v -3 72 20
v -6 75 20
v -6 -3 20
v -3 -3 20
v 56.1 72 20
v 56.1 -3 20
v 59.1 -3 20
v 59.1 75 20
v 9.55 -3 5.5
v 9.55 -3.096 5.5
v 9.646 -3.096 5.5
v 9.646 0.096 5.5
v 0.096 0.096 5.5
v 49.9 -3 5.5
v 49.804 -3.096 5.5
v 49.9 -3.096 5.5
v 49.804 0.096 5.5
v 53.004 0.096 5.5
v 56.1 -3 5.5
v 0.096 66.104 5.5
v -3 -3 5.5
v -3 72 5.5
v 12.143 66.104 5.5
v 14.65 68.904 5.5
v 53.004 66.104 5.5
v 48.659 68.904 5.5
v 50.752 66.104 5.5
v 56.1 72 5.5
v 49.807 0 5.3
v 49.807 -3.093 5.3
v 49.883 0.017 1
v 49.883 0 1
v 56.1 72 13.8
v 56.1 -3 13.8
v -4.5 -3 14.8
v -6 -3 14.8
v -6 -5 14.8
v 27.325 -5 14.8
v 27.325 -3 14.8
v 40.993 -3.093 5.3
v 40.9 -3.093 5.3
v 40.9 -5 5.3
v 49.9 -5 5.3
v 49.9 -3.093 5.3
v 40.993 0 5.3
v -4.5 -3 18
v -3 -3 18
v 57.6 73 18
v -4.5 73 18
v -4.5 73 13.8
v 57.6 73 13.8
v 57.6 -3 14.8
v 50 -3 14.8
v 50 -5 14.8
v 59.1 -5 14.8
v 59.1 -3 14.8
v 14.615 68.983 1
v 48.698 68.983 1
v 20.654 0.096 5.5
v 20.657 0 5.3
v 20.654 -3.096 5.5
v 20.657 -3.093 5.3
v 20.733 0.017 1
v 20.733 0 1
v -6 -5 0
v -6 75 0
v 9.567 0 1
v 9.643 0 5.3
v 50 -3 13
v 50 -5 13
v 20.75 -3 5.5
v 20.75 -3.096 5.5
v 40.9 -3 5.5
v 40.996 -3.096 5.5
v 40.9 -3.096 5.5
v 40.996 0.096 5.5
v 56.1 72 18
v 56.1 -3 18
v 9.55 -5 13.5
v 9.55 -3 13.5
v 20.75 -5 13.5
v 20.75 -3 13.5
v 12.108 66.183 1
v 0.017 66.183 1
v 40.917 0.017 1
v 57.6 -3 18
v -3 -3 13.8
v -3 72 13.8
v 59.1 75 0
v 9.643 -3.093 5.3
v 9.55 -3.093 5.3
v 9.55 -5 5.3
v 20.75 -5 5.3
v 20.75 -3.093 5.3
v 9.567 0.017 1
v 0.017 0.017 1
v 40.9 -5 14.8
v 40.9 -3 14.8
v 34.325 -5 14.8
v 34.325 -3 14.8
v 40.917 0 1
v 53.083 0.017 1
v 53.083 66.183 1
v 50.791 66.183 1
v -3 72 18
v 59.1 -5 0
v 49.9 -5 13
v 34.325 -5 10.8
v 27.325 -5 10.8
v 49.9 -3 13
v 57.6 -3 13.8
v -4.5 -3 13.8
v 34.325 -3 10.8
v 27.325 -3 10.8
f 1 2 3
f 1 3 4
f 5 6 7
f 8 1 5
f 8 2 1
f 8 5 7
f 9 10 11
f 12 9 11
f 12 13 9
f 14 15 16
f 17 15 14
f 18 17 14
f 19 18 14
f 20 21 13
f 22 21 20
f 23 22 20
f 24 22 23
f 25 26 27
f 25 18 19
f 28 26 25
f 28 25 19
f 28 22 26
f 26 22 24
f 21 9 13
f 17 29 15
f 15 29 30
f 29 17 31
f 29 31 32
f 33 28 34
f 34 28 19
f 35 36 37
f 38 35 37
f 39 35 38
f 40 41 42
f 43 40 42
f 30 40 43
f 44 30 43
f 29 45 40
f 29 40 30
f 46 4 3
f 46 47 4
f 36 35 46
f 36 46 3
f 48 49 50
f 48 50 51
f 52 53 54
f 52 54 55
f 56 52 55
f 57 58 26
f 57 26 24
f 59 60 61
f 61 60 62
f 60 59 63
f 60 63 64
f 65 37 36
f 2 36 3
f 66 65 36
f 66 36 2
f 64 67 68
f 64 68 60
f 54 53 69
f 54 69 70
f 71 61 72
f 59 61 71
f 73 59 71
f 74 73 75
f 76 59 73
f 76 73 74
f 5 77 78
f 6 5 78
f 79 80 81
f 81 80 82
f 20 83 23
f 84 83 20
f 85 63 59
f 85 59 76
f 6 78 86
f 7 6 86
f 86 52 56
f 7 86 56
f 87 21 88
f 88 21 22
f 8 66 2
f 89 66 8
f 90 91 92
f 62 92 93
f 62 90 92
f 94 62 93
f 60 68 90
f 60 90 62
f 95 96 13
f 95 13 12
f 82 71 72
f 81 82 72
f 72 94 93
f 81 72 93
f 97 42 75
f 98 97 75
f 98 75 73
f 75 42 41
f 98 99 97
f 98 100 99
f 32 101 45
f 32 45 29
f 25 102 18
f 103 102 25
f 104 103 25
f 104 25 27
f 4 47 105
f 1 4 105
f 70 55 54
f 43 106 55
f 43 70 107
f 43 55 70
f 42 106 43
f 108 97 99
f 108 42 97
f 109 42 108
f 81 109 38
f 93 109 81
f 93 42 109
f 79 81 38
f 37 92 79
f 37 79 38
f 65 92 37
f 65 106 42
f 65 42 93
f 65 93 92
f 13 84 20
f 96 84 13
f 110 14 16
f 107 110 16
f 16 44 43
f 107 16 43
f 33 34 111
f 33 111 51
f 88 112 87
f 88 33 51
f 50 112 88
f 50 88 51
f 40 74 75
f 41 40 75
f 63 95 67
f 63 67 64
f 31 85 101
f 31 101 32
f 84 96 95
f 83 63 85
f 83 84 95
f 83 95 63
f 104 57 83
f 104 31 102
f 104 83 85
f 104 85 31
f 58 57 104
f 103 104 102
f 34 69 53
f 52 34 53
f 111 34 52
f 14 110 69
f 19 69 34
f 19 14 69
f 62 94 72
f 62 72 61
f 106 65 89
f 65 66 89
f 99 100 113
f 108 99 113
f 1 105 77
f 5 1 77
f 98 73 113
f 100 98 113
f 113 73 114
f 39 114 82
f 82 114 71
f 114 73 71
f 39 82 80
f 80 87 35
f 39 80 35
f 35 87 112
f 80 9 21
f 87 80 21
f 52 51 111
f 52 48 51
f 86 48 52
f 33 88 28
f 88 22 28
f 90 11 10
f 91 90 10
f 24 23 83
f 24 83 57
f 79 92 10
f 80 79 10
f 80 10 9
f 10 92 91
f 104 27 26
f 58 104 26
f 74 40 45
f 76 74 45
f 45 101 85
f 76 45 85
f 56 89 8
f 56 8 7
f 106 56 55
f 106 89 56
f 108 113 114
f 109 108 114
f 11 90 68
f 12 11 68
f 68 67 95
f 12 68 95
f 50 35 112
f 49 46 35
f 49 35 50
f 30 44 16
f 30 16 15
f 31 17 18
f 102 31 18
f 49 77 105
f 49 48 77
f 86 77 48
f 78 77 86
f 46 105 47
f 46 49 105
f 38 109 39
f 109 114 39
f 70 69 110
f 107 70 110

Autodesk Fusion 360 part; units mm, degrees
sketch "Esquisse1" plane through (0, 0, 0) normal (0, 0, 1) x (1, 0, 0)
  line L0 (0, 0) -> (53.1, 0)
  line L1 (53.1, 0) -> (53.1, 66.2)
  line L2 (0, 66.2) -> (0, 0)
  line L3 (40.9, 0) -> (49.9, 0)
  line L4 (49.9, 0) -> (49.9, -5.2)
  line L5 (49.9, -5.2) -> (40.9, -5.2)
  line L6 (40.9, -5.2) -> (40.9, 0)
  line L7 (11.5, 0) -> (18.8, 0)
  line L8 (18.8, 0) -> (18.8, -1.2)
  line L9 (18.8, -1.2) -> (11.5, -1.2)
  line L10 (11.5, -1.2) -> (11.5, 0)
  line L11 (53.1, 66.2) -> (50.8, 66.2) construction
  line L12 (50.8, 66.2) -> (48.7068, 69)
  line L13 (48.7068, 69) -> (14.6068, 69)
  line L14 (12.1, 66.2) -> (14.6068, 69)
  line L15 (53.1, 66.2) -> (50.8, 66.2)
  line L16 (12.1, 66.2) -> (0, 66.2)
  line L17 (40.9, 0) -> (49.9, 0)
  line L18 (11.5, 0) -> (18.8, 0)
  line L19 (0, 33.1) -> (53.1, 33.1) construction
  line L20 (26.55, 0) -> (26.55, 33.1) construction
  line L21 (0, 66.2) -> (0, 68.7) construction
  line L22 (0, 68.7) -> (53.1, 68.7) construction
  line L23 (53.1, 68.7) -> (53.1, 66.2) construction
  line L24 (-3, 72) -> (56.1, 72)
  line L25 (56.1, 72) -> (56.1, -3)
  line L26 (56.1, -3) -> (-3, -3)
  line L27 (-3, -3) -> (-3, 72)
  line L28 (-6, 75) -> (59.1, 75)
  line L29 (59.1, 75) -> (59.1, -5)
  line L30 (59.1, -5) -> (-6, -5)
  line L31 (-6, -5) -> (-6, 75)
  line L32 (26.55, 75) -> (26.55, -5) construction
  line L33 (11.5, -1.2) -> (11.5, -5)
  line L34 (18.8, -1.2) -> (18.8, -5)
  line L35 (15.15, 0) -> (15.15, -5) construction
  line L36 (9.55, 0) -> (20.75, 0)
  line L37 (20.75, 0) -> (20.75, -5)
  line L38 (20.75, -5) -> (9.55, -5)
  line L39 (9.55, -5) -> (9.55, 0)
  line L40 (15.15, 0) -> (15.15, -5) construction
  line L41 (-3, -3) -> (-6, -3)
  line L42 (56.1, -3) -> (59.1, -3)
  dimension "d1" = 66.2
  dimension "d13" = 53.1
  dimension "d14" = 3.2
  dimension "d15" = 9
  dimension "d16" = 5.2
  dimension "d17" = 11.5
  dimension "d18" = 7.3
  dimension "d19" = 1.2
  dimension "d21" = 2.3
  dimension "d22" = 38.7
  dimension "d25" = 34.1
  dimension "d43" = 3
  dimension "d44" = 3
  dimension "d45" = 3
  dimension "d46" = 3
  dimension "d47" = 3
  dimension "d48" = 3
  dimension "d52" = 11.2
extrude "Extrusion6" add sketch "Esquisse1" along normal blind 1 contours L0 L1 L2 L3 L7 L12 L13 L14 L15 L16 L17 L18 L36
extrude "Extrusion7" add sketch "Esquisse1" along normal blind 5.5 draft 1 contours L0 L1 L2 L4 L12 L13 L14 L15 L16 L24 L25 L26 L27 L39 | L0 L6 L26 L37
extrude "Extrusion8" add sketch "Esquisse1" along normal blind 20 contours L24 L25 L27 L28 L29 L31 L41 L42
extrude "Extrusion9" add sketch "Esquisse1" along normal blind 4.5 contours L0 L10 L26 L33 L36 L39 | L0 L7 L8 L9 L10 L18 L36 | L26 L30 L33 L38 L39 | L0 L8 L26 L34 L36 L37 | L9 L26 L33 L34 | L26 L30 L33 L34 L38 | L26 L30 L34 L37 L38 | L0 L3 L4 L6 L17 L26 | L4 L6 L26 L30
extrude "Extrusion10" add sketch "Esquisse1" along normal blind 14.8 contours L26 L30 L31 L39 L41 | L6 L26 L30 L37 | L4 L26 L29 L30 L42
sketch "Esquisse2" plane through (-3, 0, 0) normal (1, 0, 0) x (0, 1, 0)
  line L0 (-3, 5.5) -> (72, 5.5)
  line L1 (72, 5.5) -> (72, 20)
  line L2 (72, 20) -> (-3, 20)
  line L3 (-3, 20) -> (-3, 14.8)
  line L4 (-3, 14.8) -> (-3, 5.5)
  line L5 (-3, 20) -> (75, 20) construction
  line L6 (-3, 18) -> (72.5, 18)
  line L7 (72.5, 18) -> (72.5, 13.8)
  line L8 (72.5, 13.8) -> (-3, 13.8)
  line L9 (-3, 13.8) -> (-3, 18)
  dimension "d65" = 2
  dimension "d66" = 4.2
  dimension "d67" = 75.5
extrude "Extrusion11" cut sketch "Esquisse2" against normal blind 1.5 contours L1 L3 L4 L6 L8 L9
sketch "Esquisse3" plane through (56.1, 0, 0) normal (-1, 0, 0) x (0, -1, 0)
  line L0 (-72, 5.5) -> (3, 5.5)
  line L1 (3, 5.5) -> (3, 14.8)
  line L2 (3, 14.8) -> (3, 20)
  line L3 (3, 20) -> (-72, 20)
  line L4 (-72, 20) -> (-72, 5.5)
  line L5 (-72, 20) -> (3, 20) construction
  line L6 (-72, 18) -> (3, 18)
  line L7 (3, 18) -> (3, 13.8)
  line L8 (3, 13.8) -> (-72, 13.8)
  line L9 (-72, 13.8) -> (-72, 18)
  dimension "d70" = 4.2
  dimension "d71" = 2
extrude "Extrusion12" cut sketch "Esquisse3" against normal blind 1.5 contours L1 L2 L4 L6 L7 L8 L9
sketch "Esquisse4" plane through (0, 72, 0) normal (0, -1, 0) x (1, 0, 0)
  line L0 (-3, 5.5) -> (56.1, 5.5)
  line L1 (56.1, 5.5) -> (56.1, 13.8)
  line L2 (56.1, 13.8) -> (57.6, 13.8)
  line L3 (57.6, 13.8) -> (57.6, 18)
  line L4 (57.6, 18) -> (56.1, 18)
  line L5 (56.1, 18) -> (56.1, 20)
  line L6 (56.1, 20) -> (-3, 20)
  line L7 (-3, 20) -> (-3, 18)
  line L8 (-3, 18) -> (-4.5, 18)
  line L9 (-4.5, 18) -> (-4.5, 13.8)
  line L10 (-4.5, 13.8) -> (-3, 13.8)
  line L11 (-3, 13.8) -> (-3, 5.5)
  line L12 (-4.5, 18) -> (57.6, 18)
  line L13 (57.6, 18) -> (57.6, 13.8)
  line L14 (57.6, 13.8) -> (-4.5, 13.8)
  line L15 (-4.5, 13.8) -> (-4.5, 18)
extrude "Extrusion13" add 2 faces at (43.9262, -1.0262, 4.5) (16.9905, -1.0262, 4.5) along direction (0, 0, 1) blind 0.8
sketch "Esquisse5" plane through (0, -3, 0) normal (0, 1, 0) x (-1, 0, 0)
  line L0 (-40.9, 5.5) -> (-20.75, 5.5)
  line L1 (-20.75, 5.5) -> (-20.75, 14.8)
  line L2 (-20.75, 14.8) -> (-40.9, 14.8)
  line L3 (-40.9, 14.8) -> (-40.9, 5.5)
  line L4 (-59.8312, 14.8) -> (5.1812, 14.8) construction
  line L5 (-50, 16) -> (-40.9, 16) construction
  line L6 (-20.75, 13.5) -> (-9.5, 13.5) construction
  line L7 (-40.9, 5.5) -> (-51, 5.5) construction
  line L8 (-51, 5.5) -> (-20.75, 5.5) construction
  line L9 (-9.284, 5.5) -> (-20.75, 5.5) construction
  line L10 (-50, 16) -> (-40.9, 16)
  line L11 (-40.9, 16) -> (-40.9, 14.8)
  line L12 (-40.9, 14.8) -> (-50, 14.8)
  line L13 (-50, 14.8) -> (-50, 16)
  line L14 (-20.75, 14.8) -> (-9.5, 14.8)
  line L15 (-9.5, 14.8) -> (-9.5, 13.5)
  line L16 (-9.5, 13.5) -> (-20.75, 13.5)
  line L17 (-20.75, 13.5) -> (-20.75, 14.8)
  line L18 (-27.325, 14.8) -> (-34.325, 14.8)
  line L19 (-34.325, 14.8) -> (-34.325, 10.8)
  line L20 (-34.325, 10.8) -> (-27.325, 10.8)
  line L21 (-27.325, 10.8) -> (-27.325, 14.8)
  line L22 (-20.75, 14.8) -> (-40.9, 14.8) construction
  line L23 (-40.9, 14.8) -> (-40.9, 5.5) construction
  line L24 (-40.9, 5.5) -> (-20.75, 5.5) construction
  line L25 (-20.75, 5.5) -> (-20.75, 14.8) construction
  line L26 (-30.825, 14.8) -> (-30.825, 10.8) construction
  line L27 (-30.825, 14.8) -> (-30.825, 5.5) construction
  dimension "d76" = 10.5
  dimension "d78" = 8
  dimension "d81" = 7
  dimension "d82" = 4
extrude "Extrusion14" add sketch "Esquisse5" against normal blind 2 contours L10 L11 L12 L13 | L1 L14 L15 L16 L17
extrude "Extrusion16" cut sketch "Esquisse5" against normal blind 2 contours L2 L18 L19 L20 L21
extrude "Extrusion17" cut sketch "Esquisse4" against normal blind 1 contours L2 L3 L4 L8 L9 L10 L12 L13 L14 L15
extrude "Extrusion19" cut 1 faces at (46.9667, -3.6667, 16) along direction (0, 0, -1) blind 3
equation "d1 = longc1"
equation "longc1 = 66.2 mm" comment "longueur Carte"
equation "largc1 = 53.1 mm" comment "largueur Carte"
equation "diffdepH = 2.5 mm" comment "différence de hauteur entre la carte et la foorme du dessus"
equation "epchar = 11 mm" comment "épaisseur de l'entrée chargeur"
equation "depconn = 1.2 mm" comment "dépassement due a l'entrée usb-c"
equation "depchar = 5.2 mm" comment "dépassement du à l'entrée charqeur"
equation "larchar = 9 mm" comment "largeur de l'entrée chargeur"
equation "larconn = 7.3 mm" comment "largeur de l'entrée USB-C"
equation "distborconn = 11.5 mm" comment "distance entre l'entrée USB-C et le bord le plus proche"
equation "distborchar = 3.2 mm" comment "distance entre l'entrée chargeur et le bord le plus proche"
equation "diffdepD = 2.3 mm" comment "distance entre bordure droit  et le dépassement"
equation "d13 = largc1"
equation "d14 = distborchar"
equation "d15 = larchar"
equation "d16 = depchar"
equation "d17 = distborconn"
equation "d18 = larconn"
equation "d19 = depconn"
equation "largdep = 34.2 mm" comment "largeur du dépassement"
equation "d21 = diffdepD"
equation "epC = 4.5 mm" comment "épaisseur de la carte"
equation "epconn = 2.5 mm" comment "epaisseur entrée usb-c"
equation "diffCB = 3 mm" comment "espace entre bordure et carte"
equation "d43 = diffCB"
equation "d44 = diffCB"
equation "d45 = diffCB"
equation "d46 = diffCB"
equation "d47 = epB"
equation "d48 = epB"
equation "epB = 3 mm" comment "épaisseur de la boite"
equation "Lpu = 11.2 mm" comment "largeur de l'embout USB-c"
equation "Hpu = 8 mm" comment "Hauteur de l'embout USB-c"
equation "d52 = Lpu"
equation "d55 = 1 mm + epC"
equation "HB = 20 mm" comment "Hauteur Boite"
equation "epV = 3.2 mm" comment "épaisseur vitre"
equation "d59 = HB"
equation "d61 = epC"
equation "d63 = HB - 2 mm - epV"
equation "d66 = epV + 1 mm"
equation "d67 = 78.000001 mm - 2.5 mm"
equation "d70 = epV + 1 mm"
equation "d76 = HC"
equation "HC = 10.5 mm" comment "hauteur del'embout chargeur"
equation "d78 = Hpu"
equation "longpin = 3 mm"
